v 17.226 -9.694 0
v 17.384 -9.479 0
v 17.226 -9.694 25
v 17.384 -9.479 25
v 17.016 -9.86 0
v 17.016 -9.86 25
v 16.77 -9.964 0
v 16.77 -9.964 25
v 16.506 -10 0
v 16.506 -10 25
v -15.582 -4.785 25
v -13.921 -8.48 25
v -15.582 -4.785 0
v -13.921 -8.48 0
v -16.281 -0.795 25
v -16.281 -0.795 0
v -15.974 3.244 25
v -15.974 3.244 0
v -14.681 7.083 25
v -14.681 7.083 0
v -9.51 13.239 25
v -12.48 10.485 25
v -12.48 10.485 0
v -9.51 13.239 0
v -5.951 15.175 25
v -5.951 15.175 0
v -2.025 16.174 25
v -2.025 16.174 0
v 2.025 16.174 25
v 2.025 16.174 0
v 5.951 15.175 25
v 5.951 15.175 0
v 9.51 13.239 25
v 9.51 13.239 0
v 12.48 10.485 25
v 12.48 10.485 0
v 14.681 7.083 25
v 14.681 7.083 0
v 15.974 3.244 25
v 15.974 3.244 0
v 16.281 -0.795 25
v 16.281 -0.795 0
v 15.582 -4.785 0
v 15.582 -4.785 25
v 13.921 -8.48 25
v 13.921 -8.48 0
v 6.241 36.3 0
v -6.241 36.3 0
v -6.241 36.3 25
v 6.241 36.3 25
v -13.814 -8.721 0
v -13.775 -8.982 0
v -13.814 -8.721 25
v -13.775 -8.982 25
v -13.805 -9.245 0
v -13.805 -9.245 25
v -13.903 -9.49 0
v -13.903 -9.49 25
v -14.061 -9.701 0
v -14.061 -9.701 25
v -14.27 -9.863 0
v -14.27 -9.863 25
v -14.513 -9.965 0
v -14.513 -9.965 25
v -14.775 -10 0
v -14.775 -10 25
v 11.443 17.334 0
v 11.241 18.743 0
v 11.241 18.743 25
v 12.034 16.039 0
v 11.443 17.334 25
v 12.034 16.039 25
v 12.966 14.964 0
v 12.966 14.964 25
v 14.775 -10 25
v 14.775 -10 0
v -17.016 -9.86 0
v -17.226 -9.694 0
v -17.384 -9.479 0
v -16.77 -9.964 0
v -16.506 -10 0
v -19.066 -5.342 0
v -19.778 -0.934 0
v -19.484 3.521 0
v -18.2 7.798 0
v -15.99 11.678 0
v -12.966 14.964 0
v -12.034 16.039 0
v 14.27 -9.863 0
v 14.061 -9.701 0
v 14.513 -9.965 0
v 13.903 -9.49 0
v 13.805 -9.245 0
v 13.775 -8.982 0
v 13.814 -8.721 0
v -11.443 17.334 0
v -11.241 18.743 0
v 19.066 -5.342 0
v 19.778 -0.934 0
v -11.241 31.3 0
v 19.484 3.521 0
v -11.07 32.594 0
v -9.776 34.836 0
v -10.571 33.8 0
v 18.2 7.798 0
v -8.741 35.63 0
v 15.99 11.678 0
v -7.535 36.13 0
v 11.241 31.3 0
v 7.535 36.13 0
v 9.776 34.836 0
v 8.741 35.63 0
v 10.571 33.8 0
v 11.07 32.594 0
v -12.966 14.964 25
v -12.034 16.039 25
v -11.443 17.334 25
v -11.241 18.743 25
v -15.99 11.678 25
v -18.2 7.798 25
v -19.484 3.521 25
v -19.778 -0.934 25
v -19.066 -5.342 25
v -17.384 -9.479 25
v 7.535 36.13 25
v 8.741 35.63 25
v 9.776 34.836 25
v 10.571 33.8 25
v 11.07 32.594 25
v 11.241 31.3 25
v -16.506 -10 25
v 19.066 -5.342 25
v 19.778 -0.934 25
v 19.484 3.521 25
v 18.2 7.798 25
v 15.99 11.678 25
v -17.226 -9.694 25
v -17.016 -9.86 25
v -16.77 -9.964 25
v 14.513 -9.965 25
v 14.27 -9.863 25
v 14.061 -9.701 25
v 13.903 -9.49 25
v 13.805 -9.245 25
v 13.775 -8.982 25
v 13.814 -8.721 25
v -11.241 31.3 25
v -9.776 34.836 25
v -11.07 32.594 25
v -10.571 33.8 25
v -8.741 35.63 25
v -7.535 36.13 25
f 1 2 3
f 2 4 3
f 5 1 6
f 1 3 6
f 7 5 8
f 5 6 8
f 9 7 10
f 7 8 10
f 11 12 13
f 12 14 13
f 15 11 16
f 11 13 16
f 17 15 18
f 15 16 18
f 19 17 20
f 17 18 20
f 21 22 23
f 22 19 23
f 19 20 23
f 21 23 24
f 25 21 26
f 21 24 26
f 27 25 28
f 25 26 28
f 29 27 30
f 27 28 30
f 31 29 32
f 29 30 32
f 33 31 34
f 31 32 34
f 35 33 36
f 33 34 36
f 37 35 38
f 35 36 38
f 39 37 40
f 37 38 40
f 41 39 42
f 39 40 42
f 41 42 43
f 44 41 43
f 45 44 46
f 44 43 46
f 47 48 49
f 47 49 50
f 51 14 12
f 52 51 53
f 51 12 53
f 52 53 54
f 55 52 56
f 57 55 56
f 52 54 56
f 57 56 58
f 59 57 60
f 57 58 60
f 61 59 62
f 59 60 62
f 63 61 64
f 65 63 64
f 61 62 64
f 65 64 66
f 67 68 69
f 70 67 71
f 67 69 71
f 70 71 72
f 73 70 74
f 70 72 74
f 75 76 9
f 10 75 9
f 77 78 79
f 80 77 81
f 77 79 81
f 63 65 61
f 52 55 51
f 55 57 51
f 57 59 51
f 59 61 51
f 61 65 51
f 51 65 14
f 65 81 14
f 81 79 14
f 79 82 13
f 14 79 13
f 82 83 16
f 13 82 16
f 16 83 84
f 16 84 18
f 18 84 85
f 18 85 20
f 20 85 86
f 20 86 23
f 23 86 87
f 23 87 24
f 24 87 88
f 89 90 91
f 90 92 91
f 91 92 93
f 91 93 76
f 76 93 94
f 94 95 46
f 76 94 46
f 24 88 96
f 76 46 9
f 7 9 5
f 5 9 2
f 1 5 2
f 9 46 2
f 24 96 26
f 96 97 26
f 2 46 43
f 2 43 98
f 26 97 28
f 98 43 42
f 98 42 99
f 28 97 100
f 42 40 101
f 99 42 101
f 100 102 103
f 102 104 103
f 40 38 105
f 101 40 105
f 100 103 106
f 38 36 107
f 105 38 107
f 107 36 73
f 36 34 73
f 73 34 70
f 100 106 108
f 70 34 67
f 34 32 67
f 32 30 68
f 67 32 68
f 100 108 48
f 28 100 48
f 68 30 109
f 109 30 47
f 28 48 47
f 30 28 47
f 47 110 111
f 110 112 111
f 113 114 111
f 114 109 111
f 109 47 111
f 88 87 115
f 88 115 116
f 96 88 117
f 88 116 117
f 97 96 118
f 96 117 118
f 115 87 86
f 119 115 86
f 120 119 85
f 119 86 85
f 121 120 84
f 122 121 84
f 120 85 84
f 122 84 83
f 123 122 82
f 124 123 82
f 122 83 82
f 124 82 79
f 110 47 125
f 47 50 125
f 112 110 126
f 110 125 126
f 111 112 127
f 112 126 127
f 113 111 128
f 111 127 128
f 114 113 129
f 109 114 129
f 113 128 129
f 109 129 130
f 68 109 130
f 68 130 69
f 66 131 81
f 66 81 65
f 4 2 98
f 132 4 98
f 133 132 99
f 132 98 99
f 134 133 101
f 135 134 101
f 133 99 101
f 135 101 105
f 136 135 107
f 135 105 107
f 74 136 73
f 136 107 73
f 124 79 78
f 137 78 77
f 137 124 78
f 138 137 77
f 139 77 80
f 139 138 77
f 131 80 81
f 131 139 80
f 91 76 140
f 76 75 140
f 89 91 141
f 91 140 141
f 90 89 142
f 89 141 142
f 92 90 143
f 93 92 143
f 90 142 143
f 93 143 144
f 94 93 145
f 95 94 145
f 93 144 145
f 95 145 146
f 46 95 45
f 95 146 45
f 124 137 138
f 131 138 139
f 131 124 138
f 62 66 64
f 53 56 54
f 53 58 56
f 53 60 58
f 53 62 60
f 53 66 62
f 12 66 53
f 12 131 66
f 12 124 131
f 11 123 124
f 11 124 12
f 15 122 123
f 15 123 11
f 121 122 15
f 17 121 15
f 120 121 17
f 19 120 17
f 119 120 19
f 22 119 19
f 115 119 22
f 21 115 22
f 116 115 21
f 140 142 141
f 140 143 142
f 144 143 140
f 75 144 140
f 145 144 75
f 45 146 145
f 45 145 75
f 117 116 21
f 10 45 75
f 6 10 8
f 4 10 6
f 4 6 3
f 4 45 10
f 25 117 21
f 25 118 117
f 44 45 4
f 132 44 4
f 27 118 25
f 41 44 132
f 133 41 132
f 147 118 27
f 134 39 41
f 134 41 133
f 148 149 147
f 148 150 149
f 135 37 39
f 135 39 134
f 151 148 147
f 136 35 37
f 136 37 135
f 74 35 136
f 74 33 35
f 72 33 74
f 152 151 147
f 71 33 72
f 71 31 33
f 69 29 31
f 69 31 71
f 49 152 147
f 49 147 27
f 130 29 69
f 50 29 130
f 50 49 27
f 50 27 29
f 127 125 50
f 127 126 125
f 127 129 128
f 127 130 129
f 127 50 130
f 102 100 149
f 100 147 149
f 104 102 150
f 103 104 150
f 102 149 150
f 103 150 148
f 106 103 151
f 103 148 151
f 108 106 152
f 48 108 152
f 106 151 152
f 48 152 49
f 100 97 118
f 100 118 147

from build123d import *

# Parameters (mm, degrees)
F1_DEPTH = 25
F3_DEPTH = 25
F4_R     = 1
F5_R     = 5


with BuildPart() as f1:
    # F0 (on Top) → F1 (new body)
    with BuildSketch(Plane.XY):
        with BuildLine():
            ThreePointArc((-12.8720627718, -10), (0, 16.3), (12.8720627718, -10))
            Line((12.8720627718, -10), (17.089177862, -10))
            ThreePointArc((17.089177862, -10), (0, 19.8), (-17.089177862, -10))
            Line((-17.089177862, -10), (-12.8720627718, -10))
        make_face()
    extrude(amount=F1_DEPTH)

    # F2 (on face) → F3 (join, through all)
    with BuildSketch(Plane(origin=(0, 0, 0), x_dir=(1, 0, 0), z_dir=(0, 0, -1))):
        Polygon((11.2405515879, -16.3), (0, -16.3), (-11.2405515879, -16.3), (-11.2405515879, -36.3), (11.2405515879, -36.3), align=None)
    extrude(amount=-F3_DEPTH)

    # F4
    f4_edges = [f1.edges().sort_by_distance(p)[0] for p in [
        (-12.872063, -10, 12.5),
        (12.872063, -10, 12.5),
        (-17.089178, -10, 12.5),
        (17.089178, -10, 12.5),
    ]]
    fillet(f4_edges, radius=F4_R)

    # F5
    f5_edges = [f1.edges().sort_by_distance(p)[0] for p in [
        (-11.240552, 16.3, 12.5),
        (11.240552, 16.3, 12.5),
        (-11.240552, 36.3, 12.5),
        (11.240552, 36.3, 12.5),
    ]]
    fillet(f5_edges, radius=F5_R)


solid = f1.part
